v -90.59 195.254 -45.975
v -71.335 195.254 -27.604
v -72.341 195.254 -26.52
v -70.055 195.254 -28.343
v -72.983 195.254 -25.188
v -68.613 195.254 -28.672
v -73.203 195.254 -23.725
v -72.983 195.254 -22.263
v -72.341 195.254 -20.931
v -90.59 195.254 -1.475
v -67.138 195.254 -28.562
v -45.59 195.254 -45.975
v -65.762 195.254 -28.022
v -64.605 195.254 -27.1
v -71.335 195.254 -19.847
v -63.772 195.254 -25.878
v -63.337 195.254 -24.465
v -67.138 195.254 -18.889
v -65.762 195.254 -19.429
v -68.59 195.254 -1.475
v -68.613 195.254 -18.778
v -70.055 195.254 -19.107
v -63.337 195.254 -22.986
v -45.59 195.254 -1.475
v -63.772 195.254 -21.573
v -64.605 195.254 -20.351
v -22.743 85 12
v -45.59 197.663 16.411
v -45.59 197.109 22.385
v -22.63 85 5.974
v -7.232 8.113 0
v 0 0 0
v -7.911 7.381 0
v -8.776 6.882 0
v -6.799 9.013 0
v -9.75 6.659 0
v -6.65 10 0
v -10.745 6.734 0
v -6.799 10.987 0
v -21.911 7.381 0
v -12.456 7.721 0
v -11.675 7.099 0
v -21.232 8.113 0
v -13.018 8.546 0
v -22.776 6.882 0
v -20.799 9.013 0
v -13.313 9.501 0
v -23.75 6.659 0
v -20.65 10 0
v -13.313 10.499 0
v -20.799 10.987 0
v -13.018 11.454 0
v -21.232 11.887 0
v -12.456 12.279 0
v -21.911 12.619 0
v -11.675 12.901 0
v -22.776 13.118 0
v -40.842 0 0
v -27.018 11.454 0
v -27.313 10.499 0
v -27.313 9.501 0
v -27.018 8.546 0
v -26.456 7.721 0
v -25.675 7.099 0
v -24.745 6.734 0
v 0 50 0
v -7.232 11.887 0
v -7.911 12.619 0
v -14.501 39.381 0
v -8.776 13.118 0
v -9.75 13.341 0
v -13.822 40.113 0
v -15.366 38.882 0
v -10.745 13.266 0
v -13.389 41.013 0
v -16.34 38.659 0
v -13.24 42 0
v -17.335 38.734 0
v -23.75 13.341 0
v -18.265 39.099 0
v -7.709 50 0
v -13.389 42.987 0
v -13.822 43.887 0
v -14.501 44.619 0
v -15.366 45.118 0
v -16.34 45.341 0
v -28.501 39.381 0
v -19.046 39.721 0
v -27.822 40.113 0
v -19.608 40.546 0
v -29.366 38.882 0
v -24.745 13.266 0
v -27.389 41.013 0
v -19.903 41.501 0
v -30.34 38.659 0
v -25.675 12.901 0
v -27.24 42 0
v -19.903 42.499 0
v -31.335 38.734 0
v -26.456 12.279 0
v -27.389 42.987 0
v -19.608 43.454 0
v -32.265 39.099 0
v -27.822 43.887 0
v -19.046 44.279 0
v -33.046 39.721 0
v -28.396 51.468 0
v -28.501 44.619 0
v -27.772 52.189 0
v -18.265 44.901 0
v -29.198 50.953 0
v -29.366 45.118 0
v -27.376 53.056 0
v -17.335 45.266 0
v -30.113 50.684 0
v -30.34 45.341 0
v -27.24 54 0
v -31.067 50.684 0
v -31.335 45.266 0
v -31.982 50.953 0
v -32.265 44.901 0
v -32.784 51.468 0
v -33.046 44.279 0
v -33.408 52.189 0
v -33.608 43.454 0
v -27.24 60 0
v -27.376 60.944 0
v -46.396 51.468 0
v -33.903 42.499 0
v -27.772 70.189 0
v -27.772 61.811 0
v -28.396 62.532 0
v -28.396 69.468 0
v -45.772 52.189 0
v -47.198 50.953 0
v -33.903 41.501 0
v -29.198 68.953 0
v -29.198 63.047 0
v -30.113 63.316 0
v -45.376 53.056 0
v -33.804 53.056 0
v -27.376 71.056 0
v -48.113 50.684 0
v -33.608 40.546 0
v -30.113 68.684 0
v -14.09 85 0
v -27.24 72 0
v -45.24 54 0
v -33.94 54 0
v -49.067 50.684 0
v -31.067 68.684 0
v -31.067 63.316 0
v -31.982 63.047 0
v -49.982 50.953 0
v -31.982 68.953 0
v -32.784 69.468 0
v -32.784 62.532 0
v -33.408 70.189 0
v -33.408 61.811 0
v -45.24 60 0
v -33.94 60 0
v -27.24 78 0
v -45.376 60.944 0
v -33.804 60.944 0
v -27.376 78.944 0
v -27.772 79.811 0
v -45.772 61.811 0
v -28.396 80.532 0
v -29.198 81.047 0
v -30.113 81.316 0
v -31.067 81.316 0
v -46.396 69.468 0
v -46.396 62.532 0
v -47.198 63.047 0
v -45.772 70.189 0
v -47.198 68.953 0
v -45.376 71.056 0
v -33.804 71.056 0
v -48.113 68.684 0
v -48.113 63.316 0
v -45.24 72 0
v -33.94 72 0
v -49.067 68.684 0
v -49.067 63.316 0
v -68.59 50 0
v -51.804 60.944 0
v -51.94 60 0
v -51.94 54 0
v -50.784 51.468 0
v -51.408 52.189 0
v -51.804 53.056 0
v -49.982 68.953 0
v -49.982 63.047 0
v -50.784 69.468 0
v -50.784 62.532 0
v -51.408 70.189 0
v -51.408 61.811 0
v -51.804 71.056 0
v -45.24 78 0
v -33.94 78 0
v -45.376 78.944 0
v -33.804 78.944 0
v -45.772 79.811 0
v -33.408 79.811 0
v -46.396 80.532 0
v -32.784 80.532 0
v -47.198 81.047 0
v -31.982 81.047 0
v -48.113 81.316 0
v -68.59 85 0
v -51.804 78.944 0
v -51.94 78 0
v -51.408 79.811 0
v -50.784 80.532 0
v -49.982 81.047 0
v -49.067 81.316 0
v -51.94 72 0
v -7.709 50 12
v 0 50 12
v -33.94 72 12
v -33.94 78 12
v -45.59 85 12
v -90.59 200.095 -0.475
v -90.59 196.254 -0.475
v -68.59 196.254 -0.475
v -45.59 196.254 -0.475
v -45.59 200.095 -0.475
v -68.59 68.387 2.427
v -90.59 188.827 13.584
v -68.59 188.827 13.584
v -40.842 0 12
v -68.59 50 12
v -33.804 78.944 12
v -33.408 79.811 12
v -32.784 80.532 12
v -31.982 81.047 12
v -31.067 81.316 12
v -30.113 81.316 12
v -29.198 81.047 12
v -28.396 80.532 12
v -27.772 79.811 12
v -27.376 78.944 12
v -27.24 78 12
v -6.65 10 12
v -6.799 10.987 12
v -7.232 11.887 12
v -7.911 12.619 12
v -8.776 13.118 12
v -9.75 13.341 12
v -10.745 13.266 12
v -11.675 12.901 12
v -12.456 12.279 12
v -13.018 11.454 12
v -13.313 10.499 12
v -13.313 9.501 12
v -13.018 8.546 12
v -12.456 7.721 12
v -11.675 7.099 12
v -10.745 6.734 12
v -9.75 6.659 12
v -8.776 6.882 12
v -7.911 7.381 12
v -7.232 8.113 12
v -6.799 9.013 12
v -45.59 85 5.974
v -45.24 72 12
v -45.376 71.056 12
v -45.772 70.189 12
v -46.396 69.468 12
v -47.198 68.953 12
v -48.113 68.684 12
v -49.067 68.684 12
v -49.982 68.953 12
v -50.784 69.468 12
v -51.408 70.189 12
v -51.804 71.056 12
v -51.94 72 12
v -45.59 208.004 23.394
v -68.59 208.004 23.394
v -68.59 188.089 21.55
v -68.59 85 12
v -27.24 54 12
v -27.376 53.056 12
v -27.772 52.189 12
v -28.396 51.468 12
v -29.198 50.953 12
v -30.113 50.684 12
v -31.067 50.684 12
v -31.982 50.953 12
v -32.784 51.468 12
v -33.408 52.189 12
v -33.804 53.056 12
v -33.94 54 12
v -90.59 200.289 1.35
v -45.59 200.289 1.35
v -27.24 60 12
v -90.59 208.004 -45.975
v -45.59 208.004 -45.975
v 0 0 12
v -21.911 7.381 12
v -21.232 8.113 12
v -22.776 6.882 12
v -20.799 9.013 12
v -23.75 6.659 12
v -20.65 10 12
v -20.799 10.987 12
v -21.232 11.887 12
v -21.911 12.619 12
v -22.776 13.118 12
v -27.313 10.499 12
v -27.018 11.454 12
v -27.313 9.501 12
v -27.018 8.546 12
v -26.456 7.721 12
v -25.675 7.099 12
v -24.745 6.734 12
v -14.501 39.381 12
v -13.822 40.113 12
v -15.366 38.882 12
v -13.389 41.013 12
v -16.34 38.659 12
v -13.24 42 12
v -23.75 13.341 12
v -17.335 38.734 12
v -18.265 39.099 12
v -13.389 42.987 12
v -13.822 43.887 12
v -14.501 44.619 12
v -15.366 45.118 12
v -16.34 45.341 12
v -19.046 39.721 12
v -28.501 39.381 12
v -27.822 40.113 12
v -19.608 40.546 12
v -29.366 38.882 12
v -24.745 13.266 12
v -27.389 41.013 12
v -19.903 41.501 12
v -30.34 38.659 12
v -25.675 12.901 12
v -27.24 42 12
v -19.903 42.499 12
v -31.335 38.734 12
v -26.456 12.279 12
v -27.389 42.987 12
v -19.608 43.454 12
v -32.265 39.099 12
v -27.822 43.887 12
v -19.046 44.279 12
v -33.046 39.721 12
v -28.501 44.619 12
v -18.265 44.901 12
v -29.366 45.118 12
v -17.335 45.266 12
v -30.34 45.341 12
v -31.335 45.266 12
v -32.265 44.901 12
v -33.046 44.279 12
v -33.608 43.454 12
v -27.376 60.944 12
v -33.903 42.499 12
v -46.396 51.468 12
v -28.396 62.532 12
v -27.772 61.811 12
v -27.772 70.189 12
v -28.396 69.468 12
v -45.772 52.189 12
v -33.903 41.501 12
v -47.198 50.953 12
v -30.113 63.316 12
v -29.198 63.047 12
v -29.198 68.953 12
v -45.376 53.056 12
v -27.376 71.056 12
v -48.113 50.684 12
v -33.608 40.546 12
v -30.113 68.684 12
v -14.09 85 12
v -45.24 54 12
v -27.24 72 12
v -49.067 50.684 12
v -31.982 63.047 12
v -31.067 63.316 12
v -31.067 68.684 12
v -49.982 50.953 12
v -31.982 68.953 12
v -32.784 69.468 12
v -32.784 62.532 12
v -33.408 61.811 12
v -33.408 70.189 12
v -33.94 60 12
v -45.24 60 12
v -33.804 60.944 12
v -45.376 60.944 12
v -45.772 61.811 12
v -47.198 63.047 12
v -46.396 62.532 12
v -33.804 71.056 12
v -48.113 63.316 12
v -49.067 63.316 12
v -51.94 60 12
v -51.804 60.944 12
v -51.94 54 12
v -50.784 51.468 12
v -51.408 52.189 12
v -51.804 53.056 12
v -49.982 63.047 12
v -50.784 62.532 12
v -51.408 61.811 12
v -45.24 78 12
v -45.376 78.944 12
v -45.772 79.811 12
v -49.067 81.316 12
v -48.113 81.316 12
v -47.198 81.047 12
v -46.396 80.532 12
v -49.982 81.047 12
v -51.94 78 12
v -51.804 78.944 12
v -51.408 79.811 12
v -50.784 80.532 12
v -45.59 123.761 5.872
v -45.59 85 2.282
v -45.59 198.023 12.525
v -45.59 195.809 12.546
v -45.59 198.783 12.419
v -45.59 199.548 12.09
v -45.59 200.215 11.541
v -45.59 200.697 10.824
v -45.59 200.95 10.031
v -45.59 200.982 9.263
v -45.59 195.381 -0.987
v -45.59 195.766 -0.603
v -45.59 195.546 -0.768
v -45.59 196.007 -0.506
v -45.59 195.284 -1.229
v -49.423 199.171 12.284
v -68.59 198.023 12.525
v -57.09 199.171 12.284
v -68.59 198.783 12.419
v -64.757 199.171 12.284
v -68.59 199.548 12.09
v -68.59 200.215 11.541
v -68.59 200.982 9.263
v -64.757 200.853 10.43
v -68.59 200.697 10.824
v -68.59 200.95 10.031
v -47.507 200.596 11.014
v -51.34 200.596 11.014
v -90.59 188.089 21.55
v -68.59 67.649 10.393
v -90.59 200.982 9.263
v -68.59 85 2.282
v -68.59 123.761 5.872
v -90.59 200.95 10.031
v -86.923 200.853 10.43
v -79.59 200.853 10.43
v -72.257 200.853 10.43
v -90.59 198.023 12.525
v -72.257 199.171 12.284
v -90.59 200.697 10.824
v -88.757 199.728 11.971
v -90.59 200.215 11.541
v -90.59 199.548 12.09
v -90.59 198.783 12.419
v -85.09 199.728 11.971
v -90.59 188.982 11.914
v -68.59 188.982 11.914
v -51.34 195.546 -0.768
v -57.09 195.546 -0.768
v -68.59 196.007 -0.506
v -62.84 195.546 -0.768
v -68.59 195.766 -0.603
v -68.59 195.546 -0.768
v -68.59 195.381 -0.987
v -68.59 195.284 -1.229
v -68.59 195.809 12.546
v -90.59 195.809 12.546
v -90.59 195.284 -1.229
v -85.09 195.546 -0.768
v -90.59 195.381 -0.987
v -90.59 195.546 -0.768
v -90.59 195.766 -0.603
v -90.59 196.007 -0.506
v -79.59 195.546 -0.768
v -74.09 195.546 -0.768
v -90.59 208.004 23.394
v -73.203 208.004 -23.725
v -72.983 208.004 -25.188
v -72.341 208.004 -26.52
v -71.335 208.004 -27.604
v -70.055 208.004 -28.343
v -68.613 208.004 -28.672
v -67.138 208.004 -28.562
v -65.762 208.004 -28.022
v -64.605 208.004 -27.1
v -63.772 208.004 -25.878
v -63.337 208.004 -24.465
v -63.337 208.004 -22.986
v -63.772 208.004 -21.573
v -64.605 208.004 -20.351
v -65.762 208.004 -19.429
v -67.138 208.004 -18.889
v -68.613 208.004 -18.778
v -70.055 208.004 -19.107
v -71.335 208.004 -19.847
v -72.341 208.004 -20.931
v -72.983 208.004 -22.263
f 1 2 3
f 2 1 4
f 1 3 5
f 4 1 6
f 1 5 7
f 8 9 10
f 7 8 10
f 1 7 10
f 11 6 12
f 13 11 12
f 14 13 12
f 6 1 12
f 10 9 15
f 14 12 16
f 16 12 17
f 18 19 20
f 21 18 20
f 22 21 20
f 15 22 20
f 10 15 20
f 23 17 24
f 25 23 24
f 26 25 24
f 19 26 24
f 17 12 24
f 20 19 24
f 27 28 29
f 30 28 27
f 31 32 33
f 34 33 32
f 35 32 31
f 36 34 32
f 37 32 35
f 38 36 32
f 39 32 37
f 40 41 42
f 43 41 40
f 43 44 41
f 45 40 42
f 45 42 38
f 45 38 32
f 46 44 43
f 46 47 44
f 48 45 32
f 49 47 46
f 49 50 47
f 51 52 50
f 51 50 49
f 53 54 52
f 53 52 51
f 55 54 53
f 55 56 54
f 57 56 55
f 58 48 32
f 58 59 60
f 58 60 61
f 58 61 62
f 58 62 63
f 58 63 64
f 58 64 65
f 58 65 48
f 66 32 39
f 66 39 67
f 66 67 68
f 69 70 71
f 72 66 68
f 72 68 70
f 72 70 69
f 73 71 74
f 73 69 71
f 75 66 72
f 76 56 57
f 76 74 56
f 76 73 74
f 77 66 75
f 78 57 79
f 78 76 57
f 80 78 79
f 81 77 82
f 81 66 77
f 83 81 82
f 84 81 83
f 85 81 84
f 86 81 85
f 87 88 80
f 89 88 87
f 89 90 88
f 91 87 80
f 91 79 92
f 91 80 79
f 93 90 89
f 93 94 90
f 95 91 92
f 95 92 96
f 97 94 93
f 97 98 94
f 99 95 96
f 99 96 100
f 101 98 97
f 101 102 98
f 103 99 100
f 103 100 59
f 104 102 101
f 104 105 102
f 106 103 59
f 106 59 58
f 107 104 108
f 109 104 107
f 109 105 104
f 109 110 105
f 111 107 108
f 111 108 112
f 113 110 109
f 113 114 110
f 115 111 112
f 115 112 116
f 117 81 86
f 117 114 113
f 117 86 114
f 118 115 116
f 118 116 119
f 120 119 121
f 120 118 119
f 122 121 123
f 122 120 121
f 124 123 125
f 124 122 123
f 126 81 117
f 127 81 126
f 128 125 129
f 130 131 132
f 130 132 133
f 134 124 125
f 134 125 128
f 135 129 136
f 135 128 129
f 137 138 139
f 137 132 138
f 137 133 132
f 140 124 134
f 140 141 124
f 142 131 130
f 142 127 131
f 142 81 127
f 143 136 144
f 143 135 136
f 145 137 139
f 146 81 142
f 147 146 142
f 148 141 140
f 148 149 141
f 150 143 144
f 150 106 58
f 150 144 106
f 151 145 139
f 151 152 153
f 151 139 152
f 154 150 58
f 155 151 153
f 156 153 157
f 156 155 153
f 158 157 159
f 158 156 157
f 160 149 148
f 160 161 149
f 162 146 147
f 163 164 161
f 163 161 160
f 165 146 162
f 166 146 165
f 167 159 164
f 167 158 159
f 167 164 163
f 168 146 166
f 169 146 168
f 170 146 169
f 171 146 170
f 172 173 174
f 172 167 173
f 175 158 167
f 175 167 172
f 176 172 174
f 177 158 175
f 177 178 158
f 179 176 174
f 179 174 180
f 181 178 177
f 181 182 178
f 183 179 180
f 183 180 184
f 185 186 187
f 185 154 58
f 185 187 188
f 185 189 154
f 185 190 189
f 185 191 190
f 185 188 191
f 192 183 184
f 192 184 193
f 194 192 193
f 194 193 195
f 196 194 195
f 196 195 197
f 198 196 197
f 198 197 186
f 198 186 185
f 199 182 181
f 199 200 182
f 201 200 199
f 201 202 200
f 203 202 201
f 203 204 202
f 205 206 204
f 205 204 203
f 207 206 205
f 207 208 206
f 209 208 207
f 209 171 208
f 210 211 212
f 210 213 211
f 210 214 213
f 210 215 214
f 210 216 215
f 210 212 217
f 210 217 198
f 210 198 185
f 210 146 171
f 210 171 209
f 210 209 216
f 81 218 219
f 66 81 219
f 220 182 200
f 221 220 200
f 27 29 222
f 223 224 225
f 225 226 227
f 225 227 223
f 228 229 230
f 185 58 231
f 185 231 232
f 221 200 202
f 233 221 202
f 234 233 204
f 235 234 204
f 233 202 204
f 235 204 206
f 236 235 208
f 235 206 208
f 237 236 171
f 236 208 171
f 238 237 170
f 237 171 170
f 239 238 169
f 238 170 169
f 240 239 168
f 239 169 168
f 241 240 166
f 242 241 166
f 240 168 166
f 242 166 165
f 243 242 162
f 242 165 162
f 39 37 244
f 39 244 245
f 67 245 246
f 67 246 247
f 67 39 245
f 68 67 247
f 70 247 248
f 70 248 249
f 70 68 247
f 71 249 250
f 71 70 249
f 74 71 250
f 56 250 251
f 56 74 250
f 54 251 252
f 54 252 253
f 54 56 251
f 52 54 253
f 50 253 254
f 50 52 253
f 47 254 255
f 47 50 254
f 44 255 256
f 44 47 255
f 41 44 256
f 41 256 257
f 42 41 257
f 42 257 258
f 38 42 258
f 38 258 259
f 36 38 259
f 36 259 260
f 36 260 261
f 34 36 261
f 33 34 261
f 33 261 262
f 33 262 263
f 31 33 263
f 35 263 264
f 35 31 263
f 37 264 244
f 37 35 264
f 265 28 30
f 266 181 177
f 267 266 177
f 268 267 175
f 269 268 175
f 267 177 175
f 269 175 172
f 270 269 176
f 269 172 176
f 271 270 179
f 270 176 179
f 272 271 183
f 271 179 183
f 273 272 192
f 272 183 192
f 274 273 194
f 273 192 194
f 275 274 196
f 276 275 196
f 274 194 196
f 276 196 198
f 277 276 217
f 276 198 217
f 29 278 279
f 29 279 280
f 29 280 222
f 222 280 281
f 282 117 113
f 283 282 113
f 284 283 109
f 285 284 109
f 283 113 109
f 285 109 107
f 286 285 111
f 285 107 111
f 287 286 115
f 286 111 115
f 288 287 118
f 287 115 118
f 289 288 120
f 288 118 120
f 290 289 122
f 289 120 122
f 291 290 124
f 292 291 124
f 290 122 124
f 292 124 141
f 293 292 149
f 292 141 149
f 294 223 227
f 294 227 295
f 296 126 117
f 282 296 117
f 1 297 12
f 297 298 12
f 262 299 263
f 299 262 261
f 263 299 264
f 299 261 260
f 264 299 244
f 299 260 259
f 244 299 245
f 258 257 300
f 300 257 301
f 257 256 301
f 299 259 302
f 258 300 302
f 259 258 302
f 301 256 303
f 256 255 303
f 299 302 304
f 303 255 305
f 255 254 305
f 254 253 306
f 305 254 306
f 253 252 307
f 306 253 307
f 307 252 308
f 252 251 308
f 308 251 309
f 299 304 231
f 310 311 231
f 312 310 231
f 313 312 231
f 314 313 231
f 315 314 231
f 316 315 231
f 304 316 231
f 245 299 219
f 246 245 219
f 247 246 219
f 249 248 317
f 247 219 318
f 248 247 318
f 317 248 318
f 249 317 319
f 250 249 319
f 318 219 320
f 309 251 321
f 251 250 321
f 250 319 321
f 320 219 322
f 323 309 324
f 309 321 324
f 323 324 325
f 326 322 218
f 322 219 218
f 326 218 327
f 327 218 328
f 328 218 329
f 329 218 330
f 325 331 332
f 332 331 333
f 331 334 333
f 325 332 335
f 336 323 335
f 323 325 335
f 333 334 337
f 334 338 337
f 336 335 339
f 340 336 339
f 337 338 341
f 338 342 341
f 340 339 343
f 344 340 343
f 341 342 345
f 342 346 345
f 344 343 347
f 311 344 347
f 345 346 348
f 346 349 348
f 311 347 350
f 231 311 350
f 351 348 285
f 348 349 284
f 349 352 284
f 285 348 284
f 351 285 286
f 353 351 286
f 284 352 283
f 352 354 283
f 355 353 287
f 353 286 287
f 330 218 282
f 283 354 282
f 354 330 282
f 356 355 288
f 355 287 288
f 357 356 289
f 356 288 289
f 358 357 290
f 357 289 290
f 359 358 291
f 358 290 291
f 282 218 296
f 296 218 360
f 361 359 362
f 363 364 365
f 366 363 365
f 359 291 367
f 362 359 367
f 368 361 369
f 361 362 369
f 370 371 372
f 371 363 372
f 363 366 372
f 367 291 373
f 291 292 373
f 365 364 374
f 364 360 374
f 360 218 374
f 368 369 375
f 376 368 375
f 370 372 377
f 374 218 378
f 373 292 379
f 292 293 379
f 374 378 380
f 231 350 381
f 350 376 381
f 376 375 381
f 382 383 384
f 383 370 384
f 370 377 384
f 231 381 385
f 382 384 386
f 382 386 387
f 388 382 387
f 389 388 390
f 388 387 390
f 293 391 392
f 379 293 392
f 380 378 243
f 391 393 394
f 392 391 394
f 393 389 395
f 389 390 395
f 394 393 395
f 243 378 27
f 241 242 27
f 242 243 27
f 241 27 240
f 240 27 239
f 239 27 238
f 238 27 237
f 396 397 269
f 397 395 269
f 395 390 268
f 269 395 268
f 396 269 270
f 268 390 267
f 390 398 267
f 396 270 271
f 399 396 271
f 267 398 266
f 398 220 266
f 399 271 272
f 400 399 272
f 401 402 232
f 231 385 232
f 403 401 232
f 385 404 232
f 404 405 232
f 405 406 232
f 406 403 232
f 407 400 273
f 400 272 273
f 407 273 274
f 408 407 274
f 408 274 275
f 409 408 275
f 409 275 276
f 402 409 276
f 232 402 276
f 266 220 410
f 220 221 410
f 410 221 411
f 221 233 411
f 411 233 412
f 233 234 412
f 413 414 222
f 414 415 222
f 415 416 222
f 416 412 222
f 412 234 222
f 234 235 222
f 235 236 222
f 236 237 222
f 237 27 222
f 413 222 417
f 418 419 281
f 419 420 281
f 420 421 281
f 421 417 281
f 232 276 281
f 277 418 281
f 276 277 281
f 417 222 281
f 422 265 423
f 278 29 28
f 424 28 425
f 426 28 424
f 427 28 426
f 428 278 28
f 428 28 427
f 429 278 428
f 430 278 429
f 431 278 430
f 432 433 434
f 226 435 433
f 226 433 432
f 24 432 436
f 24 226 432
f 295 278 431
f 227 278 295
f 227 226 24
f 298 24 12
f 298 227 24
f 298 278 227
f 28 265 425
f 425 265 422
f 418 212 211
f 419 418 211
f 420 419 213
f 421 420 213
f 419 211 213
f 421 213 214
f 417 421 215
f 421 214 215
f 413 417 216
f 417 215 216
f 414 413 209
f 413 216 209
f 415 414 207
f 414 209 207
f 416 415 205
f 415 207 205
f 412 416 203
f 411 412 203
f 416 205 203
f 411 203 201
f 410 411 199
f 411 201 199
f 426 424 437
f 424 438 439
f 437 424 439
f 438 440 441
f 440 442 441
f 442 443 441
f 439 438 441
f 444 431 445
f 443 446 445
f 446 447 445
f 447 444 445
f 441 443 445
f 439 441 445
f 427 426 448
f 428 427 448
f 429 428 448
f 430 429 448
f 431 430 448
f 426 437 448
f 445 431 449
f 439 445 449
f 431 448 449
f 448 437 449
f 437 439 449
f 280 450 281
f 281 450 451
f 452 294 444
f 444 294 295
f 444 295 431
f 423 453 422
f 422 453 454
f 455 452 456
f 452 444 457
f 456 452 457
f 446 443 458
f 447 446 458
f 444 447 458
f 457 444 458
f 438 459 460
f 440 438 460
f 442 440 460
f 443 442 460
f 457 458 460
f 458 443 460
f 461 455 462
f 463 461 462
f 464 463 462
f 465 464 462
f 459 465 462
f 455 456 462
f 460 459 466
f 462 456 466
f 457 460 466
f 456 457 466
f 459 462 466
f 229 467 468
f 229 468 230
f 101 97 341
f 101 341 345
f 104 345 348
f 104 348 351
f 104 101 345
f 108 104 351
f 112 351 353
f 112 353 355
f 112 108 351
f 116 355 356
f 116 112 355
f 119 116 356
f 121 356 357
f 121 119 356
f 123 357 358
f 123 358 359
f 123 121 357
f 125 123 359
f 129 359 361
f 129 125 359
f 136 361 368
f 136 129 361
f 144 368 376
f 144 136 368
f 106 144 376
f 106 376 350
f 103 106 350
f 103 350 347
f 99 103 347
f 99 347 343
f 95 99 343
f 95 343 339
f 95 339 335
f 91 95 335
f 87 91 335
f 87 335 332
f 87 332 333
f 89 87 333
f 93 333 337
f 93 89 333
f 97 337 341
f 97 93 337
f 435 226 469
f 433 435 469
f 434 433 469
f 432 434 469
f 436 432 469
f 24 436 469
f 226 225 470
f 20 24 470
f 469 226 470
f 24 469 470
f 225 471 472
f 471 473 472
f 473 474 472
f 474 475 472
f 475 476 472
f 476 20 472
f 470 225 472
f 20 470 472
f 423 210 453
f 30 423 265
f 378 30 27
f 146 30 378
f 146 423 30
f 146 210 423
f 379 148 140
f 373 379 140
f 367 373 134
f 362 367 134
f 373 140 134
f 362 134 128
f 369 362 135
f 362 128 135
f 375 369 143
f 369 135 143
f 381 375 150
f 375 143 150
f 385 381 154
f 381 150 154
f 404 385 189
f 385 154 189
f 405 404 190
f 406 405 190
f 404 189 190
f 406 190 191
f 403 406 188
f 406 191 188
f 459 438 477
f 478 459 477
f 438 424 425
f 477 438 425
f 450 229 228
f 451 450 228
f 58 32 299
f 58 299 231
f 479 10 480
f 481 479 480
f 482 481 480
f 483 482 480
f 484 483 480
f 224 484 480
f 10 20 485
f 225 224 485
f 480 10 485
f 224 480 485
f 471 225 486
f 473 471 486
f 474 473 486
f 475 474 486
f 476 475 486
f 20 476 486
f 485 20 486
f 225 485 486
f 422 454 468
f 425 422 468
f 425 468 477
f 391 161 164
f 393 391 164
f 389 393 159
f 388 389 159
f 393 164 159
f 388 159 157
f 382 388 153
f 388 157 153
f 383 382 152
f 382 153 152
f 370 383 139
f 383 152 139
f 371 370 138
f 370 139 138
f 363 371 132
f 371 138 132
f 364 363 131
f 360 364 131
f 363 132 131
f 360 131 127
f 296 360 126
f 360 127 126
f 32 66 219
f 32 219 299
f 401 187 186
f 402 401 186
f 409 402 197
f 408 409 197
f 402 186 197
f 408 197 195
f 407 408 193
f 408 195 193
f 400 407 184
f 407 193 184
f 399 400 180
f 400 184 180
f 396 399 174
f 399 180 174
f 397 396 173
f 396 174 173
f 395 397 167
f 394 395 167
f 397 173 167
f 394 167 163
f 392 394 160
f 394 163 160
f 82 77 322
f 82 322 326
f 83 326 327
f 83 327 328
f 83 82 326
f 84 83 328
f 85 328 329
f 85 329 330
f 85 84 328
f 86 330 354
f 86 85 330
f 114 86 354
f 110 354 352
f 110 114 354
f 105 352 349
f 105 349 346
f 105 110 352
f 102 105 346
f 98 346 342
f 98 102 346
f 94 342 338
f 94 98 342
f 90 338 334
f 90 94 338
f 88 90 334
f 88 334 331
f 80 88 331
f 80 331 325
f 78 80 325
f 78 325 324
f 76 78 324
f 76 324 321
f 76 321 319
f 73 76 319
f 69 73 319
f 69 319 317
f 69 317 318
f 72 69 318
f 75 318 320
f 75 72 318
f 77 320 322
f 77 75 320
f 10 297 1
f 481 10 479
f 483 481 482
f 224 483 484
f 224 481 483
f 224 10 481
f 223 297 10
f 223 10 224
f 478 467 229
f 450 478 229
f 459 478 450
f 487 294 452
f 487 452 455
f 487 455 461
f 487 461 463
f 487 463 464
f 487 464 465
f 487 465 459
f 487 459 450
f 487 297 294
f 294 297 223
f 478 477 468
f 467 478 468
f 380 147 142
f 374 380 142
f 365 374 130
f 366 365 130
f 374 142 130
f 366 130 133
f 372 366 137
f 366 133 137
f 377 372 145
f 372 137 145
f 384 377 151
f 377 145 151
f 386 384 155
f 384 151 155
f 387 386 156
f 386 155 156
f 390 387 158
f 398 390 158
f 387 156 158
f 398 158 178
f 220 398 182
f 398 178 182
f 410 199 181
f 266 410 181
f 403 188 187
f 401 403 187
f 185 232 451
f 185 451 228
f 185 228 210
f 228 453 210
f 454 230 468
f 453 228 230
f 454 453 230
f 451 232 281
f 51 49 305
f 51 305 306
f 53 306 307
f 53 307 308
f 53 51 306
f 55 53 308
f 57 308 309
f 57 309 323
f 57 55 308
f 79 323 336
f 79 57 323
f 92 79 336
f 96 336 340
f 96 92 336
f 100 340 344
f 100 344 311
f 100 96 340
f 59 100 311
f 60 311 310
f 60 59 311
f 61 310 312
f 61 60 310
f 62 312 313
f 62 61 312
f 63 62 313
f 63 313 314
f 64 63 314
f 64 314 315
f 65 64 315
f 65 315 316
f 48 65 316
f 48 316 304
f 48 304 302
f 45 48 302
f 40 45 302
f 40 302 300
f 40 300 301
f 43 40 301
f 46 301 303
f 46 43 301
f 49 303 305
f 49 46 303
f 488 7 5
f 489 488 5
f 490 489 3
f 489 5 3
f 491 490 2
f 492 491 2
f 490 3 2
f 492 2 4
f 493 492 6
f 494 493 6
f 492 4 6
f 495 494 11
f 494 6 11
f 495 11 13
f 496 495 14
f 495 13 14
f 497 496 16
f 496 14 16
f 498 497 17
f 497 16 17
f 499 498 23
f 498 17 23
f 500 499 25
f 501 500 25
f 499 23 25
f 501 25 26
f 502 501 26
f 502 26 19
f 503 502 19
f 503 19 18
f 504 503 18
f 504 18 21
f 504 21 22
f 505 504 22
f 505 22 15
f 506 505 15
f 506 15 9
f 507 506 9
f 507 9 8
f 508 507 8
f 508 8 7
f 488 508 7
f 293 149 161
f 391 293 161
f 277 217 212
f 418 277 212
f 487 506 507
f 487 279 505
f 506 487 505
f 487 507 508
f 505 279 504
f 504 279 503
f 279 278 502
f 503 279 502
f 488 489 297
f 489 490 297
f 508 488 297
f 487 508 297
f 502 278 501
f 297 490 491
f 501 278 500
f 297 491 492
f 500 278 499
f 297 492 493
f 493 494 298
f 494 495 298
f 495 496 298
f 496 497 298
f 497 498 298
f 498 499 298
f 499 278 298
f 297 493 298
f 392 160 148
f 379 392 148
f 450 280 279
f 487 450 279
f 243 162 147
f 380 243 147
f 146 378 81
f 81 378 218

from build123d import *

# Parameters (mm, degrees)
SKETCH1_R                        = 3.35
BOSS_EXTRUDE1_DEPTH              = 12
BOSS_EXTRUDE4_DEPTH              = 23
CUT_EXTRUDE2_DEPTH               = 227.564419348
BOSS_EXTRUDE5_DEPTH              = 22
RIB8_REACH                       = 234.673
SKETCH9_WALL_W                   = 590.286406192
SKETCH9_WALL_H                   = 8
RIB13_REACH                      = 234.673
SKETCH10_WALL_W                  = 582.229830078
SKETCH10_WALL_H                  = 6
F_25_64_0_39063_DIAMETER_HOLE1_D = 9.922002


with BuildPart() as part:
    # Sketch1 → Boss-Extrude1 (new body)
    with BuildSketch(Plane.XY):
        Polygon((0, 0), (-40.842464086, 0), (-68.59, 50), (-68.59, 85), (0, 85), align=None)
        with Locations((-30.59, 42)):
            Circle(SKETCH1_R, mode=Mode.SUBTRACT)
        with Locations((-16.59, 42)):
            Circle(SKETCH1_R, mode=Mode.SUBTRACT)
        with Locations((-24, 10)):
            Circle(SKETCH1_R, mode=Mode.SUBTRACT)
        with Locations((-10, 10)):
            Circle(SKETCH1_R, mode=Mode.SUBTRACT)
        with BuildLine():
            Line((-45.24, 60), (-45.24, 54))
            ThreePointArc((-45.24, 54), (-48.59, 50.65), (-51.94, 54))
            Line((-51.94, 54), (-51.94, 60))
            ThreePointArc((-51.94, 60), (-48.59, 63.35), (-45.24, 60))
        make_face(mode=Mode.SUBTRACT)
        with BuildLine():
            Line((-45.24, 78), (-45.24, 72))
            ThreePointArc((-45.24, 72), (-48.59, 68.65), (-51.94, 72))
            Line((-51.94, 72), (-51.94, 78))
            ThreePointArc((-51.94, 78), (-48.59, 81.35), (-45.24, 78))
        make_face(mode=Mode.SUBTRACT)
        with BuildLine():
            Line((-27.24, 78), (-27.24, 72))
            ThreePointArc((-27.24, 72), (-30.59, 68.65), (-33.94, 72))
            Line((-33.94, 72), (-33.94, 78))
            ThreePointArc((-33.94, 78), (-30.59, 81.35), (-27.24, 78))
        make_face(mode=Mode.SUBTRACT)
        with BuildLine():
            Line((-27.24, 60), (-27.24, 54))
            ThreePointArc((-27.24, 54), (-30.59, 50.65), (-33.94, 54))
            Line((-33.94, 54), (-33.94, 60))
            ThreePointArc((-33.94, 60), (-30.59, 63.35), (-27.24, 60))
        make_face(mode=Mode.SUBTRACT)
    extrude(amount=BOSS_EXTRUDE1_DEPTH)

    # Sketch4 → Boss-Extrude4 (add)
    with BuildSketch(Plane.ZY.offset(68.59)):
        with BuildLine():
            Line((1.350364369, 200.289400401), (-0.475324009, 200.094696819))
            Line((-0.475324009, 200.094696819), (-0.475324009, 198.169964836))
            Line((-0.475324009, 198.169964836), (-0.475324009, 196.253602357))
            add(Edge.make_bspline(
                [(-0.475324009, 196.253602357), (-0.475324009, 196.12869199), (-0.518289538, 195.884432771), (-0.746214851, 195.524493199), (-1.106154424, 195.296567886), (-1.350413642, 195.253602357), (-1.475324009, 195.253602357)],
                knots=[0, 0, 0, 0, 0.25, 0.5, 0.75, 1, 1, 1, 1], degree=3))
            Line((-1.475324009, 195.253602357), (-45.975324009, 195.253602357))
            Line((-45.975324009, 195.253602357), (-45.975324009, 208.004109944))
            Line((-45.975324009, 208.004109944), (23.394468779, 208.004109944))
            Line((23.394468779, 208.004109944), (12, 85))
            Line((12, 85), (2.281711333, 85))
            Line((2.281711333, 85), (5.872362287, 123.761337788))
            Line((5.872362287, 123.761337788), (12.546460431, 195.808707235))
            Line((12.546460431, 195.808707235), (12.52462737, 198.022692939))
            add(Edge.make_bspline(
                [(12.52462737, 198.022692939), (12.52275101, 198.212965603), (12.485055554, 198.584771055), (12.246945435, 199.373301804), (11.607215228, 200.288314456), (10.634477398, 200.836296213), (9.82657242, 200.996816362), (9.452863838, 200.998278344), (9.263306003, 200.981694182)],
                knots=[0, 0, 0, 0, 0.125, 0.25, 0.5, 0.75, 0.875, 1, 1, 1, 1], degree=3))
            Line((9.263306003, 200.981694182), (1.350364369, 200.289400401))
        make_face()
    extrude(amount=-BOSS_EXTRUDE4_DEPTH)

    # Sketch6 → Cut-Extrude2 (cut, through all)
    with BuildSketch(Plane.XY.offset(12)):
        Polygon((-16.781583806, 99.760607563), (-7.709196228, 49.999997515), (7.428297799, 49.999995871), (-1.644090079, 99.760607563), align=None)
    extrude(amount=-CUT_EXTRUDE2_DEPTH, mode=Mode.SUBTRACT)

    # Sketch7 → Boss-Extrude5 (add)
    with BuildSketch(Plane.ZY.offset(68.59)):
        with BuildLine():
            Line((1.350364369, 200.289400401), (9.263306003, 200.981694182))
            add(Edge.make_bspline(
                [(9.263306003, 200.981694182), (9.452863838, 200.998278344), (9.82657242, 200.996816362), (10.634477398, 200.836296213), (11.607215228, 200.288314456), (12.246945435, 199.373301804), (12.485055554, 198.584771055), (12.52275101, 198.212965603), (12.52462737, 198.022692939)],
                knots=[0, 0, 0, 0, 0.125, 0.25, 0.5, 0.75, 0.875, 1, 1, 1, 1], degree=3))
            Line((12.52462737, 198.022692939), (12.546460431, 195.808707235))
            Line((12.546460431, 195.808707235), (11.914066265, 188.98196658))
            Line((11.914066265, 188.98196658), (21.549669936, 188.089373761))
            Line((21.549669936, 188.089373761), (23.394468779, 208.004109944))
            Line((23.394468779, 208.004109944), (-45.975324009, 208.004109944))
            Line((-45.975324009, 208.004109944), (-45.975324009, 195.253602357))
            Line((-45.975324009, 195.253602357), (-1.475324009, 195.253602357))
            add(Edge.make_bspline(
                [(-1.475324009, 195.253602357), (-1.350413642, 195.253602357), (-1.106154424, 195.296567886), (-0.746214851, 195.524493199), (-0.518289538, 195.884432771), (-0.475324009, 196.12869199), (-0.475324009, 196.253602357)],
                knots=[0, 0, 0, 0, 0.25, 0.5, 0.75, 1, 1, 1, 1], degree=3))
            Line((-0.475324009, 196.253602357), (-0.475324009, 200.094696819))
            Line((-0.475324009, 200.094696819), (1.350364369, 200.289400401))
        make_face()
    extrude(amount=BOSS_EXTRUDE5_DEPTH)

    # Sketch9 wall → Rib8 (add, up to next)
    with BuildSketch(Plane(origin=(-79.59, 127.869133691, 15.971176294), x_dir=(0.178948228267, -0.979664115124, -0.090751050339), z_dir=(0.983858491654, 0.178185337816, 0.016506174221)), mode=Mode.PRIVATE) as rib8_sk1:
        with Locations((0, 4)):
            Rectangle(SKETCH9_WALL_W, SKETCH9_WALL_H)
    rib8_tool1 = extrude(rib8_sk1.sketch, amount=RIB8_REACH, mode=Mode.PRIVATE) - part.part
    add(rib8_tool1.solids().sort_by_distance((-79.59, 127.869133691, 15.971176294))[0])

    # Sketch10 wall → Rib13 (add, up to next)
    with BuildSketch(Plane(origin=(-34.166372331, 141.054628888, 17.192612824), x_dir=(0.198872370592, -0.975847362421, -0.090397485977), z_dir=(0.98002539774, 0.198024539719, 0.018343975956)), mode=Mode.PRIVATE) as rib13_sk1:
        with Locations((0, 3)):
            Rectangle(SKETCH10_WALL_W, SKETCH10_WALL_H)
    rib13_tool1 = extrude(rib13_sk1.sketch, amount=-RIB13_REACH, mode=Mode.PRIVATE) - part.part
    add(rib13_tool1.solids().sort_by_distance((-34.166372331, 141.054628888, 17.192612824))[0])

    # 25/64 (0.39063) Diameter Hole1 (through all)
    with Locations(Plane(origin=(0, 208.004109944, 0), x_dir=(1, 0, 0), z_dir=(0, 1, 0))):
        with Locations((-68.242097157, 23.725324009)):
            Hole(F_25_64_0_39063_DIAMETER_HOLE1_D / 2)


solid = part.part
